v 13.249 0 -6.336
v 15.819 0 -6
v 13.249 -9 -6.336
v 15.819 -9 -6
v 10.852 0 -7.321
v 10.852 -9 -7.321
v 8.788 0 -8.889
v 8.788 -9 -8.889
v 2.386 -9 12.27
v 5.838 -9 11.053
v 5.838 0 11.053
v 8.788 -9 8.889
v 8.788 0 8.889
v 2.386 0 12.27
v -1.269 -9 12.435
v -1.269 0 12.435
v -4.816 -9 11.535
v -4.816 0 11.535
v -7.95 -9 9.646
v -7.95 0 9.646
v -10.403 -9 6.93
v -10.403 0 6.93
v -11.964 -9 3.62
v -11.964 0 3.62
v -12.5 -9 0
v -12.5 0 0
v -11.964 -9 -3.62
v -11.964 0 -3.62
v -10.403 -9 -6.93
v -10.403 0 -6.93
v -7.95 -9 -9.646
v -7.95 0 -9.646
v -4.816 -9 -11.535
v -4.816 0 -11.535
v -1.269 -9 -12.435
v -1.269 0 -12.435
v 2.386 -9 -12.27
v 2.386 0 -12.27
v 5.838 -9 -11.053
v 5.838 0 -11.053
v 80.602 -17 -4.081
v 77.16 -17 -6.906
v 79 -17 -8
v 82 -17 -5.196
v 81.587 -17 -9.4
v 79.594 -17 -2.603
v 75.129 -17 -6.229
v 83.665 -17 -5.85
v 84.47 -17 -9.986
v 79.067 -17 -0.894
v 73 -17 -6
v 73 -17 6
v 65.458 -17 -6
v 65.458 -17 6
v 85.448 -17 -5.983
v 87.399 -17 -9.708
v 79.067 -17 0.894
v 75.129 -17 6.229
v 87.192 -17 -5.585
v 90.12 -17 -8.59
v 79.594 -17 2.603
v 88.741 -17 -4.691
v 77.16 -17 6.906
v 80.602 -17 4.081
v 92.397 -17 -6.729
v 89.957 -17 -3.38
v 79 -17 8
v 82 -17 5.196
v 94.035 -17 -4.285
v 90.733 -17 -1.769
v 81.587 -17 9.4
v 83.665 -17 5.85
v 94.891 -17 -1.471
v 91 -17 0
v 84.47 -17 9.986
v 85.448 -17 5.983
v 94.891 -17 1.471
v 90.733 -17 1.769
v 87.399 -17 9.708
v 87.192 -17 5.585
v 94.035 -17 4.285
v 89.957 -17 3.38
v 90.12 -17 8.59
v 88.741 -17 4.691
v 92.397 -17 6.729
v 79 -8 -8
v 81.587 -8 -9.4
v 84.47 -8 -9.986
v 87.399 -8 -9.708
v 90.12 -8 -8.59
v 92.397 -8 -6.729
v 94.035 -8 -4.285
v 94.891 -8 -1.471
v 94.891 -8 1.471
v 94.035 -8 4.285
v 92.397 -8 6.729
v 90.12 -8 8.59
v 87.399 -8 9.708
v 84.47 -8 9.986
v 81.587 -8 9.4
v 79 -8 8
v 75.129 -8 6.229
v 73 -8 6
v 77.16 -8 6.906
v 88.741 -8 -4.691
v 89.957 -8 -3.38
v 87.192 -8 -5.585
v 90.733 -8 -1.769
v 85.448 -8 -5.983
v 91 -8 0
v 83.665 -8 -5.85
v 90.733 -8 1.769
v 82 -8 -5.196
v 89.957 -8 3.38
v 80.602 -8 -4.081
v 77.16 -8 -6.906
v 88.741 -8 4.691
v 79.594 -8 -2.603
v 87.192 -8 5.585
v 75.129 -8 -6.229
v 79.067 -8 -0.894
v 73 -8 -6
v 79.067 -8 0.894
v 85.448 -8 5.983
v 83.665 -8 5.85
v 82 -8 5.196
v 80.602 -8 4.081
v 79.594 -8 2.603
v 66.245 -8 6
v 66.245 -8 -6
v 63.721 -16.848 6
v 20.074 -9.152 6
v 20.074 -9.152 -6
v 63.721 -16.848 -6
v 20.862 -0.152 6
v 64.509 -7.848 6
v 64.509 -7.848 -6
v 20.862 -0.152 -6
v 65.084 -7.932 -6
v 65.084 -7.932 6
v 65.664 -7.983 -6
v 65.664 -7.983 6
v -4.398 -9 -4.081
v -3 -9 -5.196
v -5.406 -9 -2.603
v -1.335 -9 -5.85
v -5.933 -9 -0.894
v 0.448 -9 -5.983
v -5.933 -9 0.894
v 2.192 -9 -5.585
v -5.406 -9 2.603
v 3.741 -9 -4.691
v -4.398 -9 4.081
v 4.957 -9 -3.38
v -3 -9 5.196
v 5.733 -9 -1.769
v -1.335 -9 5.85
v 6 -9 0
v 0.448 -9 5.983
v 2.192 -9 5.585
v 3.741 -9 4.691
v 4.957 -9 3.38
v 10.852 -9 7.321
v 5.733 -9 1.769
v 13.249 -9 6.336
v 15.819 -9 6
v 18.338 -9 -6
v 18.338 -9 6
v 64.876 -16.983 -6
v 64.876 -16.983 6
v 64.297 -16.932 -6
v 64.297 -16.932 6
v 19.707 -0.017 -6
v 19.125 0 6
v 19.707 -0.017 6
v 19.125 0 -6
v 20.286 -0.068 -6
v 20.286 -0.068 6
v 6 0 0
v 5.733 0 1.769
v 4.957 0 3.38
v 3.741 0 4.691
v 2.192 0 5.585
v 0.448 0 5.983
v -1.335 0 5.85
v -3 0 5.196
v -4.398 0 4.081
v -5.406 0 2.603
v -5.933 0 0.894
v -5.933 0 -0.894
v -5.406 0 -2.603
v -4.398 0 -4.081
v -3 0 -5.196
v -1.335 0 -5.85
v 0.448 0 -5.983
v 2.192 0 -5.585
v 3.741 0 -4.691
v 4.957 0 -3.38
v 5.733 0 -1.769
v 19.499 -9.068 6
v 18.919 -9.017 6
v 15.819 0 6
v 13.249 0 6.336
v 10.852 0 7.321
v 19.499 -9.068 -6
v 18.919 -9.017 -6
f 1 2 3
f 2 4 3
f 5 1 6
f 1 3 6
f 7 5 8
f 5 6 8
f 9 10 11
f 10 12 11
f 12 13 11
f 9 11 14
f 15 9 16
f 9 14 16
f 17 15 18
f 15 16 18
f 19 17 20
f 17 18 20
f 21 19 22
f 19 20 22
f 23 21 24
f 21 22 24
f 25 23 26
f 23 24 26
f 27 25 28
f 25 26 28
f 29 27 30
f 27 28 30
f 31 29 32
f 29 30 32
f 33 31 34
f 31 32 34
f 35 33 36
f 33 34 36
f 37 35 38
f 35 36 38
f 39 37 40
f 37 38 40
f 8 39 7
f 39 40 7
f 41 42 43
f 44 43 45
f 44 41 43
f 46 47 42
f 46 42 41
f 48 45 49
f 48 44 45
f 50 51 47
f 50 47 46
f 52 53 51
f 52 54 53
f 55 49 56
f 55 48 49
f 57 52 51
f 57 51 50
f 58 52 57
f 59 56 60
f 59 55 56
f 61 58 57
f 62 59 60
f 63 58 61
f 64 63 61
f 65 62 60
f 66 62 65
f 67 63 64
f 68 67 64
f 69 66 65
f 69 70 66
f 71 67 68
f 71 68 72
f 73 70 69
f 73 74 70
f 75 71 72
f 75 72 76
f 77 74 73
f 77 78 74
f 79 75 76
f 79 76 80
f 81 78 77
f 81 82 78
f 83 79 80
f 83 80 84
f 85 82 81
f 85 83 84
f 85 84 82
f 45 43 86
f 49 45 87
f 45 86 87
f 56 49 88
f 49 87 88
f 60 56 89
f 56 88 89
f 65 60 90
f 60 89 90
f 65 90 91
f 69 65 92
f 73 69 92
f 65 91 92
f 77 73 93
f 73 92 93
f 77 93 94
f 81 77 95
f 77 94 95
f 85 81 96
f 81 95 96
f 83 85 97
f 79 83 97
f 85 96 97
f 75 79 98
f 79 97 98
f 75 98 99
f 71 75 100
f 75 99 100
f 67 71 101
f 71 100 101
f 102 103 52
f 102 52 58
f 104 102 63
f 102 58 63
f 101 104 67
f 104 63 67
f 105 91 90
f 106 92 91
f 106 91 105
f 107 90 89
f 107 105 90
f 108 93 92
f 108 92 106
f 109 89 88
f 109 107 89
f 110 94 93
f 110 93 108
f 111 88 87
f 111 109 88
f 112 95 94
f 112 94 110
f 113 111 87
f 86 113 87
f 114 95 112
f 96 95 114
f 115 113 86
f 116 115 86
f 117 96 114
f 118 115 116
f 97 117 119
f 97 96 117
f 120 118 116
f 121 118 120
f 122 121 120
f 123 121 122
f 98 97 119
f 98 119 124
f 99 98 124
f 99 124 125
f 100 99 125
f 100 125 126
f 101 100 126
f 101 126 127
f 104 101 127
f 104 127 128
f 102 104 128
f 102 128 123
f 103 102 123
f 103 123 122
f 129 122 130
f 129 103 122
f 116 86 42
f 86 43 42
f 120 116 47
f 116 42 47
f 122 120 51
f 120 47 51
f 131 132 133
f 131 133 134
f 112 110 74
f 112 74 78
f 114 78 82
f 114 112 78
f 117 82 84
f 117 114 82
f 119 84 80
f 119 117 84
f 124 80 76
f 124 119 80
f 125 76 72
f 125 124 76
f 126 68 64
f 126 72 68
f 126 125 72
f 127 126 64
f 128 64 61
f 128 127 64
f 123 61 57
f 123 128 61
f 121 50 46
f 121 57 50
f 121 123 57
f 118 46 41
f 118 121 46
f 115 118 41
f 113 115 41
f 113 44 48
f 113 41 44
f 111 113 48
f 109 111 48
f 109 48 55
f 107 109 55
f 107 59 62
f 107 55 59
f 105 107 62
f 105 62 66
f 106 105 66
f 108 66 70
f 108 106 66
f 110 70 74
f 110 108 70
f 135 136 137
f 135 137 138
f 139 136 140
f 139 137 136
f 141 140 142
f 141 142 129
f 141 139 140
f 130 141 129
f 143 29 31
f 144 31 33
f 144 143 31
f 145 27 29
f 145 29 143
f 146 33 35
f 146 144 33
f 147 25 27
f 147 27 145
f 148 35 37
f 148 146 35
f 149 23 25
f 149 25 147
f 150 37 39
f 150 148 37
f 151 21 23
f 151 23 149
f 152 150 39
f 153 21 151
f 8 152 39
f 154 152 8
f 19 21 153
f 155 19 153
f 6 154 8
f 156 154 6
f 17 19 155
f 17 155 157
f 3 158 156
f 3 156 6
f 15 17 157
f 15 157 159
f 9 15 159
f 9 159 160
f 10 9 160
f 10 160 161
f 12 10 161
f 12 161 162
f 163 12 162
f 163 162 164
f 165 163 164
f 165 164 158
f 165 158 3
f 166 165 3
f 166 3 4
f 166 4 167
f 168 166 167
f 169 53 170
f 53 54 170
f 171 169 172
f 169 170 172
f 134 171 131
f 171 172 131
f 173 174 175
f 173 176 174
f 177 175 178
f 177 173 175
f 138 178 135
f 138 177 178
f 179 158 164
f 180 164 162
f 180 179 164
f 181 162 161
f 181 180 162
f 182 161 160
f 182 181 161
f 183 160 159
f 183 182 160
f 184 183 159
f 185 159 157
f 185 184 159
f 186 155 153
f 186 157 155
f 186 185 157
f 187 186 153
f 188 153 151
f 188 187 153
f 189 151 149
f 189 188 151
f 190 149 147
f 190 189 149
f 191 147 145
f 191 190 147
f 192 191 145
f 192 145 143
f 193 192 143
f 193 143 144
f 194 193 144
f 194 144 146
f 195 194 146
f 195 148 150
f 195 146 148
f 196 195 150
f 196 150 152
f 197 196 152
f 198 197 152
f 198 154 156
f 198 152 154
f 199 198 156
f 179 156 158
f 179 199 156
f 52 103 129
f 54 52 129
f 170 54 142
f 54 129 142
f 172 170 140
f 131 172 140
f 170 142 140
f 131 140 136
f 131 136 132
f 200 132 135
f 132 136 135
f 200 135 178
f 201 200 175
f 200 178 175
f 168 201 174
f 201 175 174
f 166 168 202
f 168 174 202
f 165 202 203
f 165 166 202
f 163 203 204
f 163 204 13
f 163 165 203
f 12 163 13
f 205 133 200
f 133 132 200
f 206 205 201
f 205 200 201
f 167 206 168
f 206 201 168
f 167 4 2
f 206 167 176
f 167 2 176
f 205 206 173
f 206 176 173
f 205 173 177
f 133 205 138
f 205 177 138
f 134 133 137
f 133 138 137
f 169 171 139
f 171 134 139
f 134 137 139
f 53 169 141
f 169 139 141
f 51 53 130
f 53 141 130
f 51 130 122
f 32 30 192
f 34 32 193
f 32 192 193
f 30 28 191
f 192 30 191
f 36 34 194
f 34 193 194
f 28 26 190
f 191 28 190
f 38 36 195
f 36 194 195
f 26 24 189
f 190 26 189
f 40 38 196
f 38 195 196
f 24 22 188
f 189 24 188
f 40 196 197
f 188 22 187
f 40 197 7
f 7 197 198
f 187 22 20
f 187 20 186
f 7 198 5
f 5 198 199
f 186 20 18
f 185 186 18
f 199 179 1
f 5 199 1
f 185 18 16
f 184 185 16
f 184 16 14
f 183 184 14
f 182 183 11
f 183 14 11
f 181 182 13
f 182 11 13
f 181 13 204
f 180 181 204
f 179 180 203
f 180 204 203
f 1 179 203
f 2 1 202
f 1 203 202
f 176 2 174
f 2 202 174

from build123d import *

# Parameters (mm, degrees)
F0_R     = 6
F1_DEPTH = 25
F2_W     = 18
F2_H     = 9
F3_DEPTH = 12.5
F4_R     = 10


with BuildPart() as f1:
    # F0 (on Front) → F1 (new body)
    with BuildSketch(Plane.XZ):
        with BuildLine():
            Line((77, 6), (10.965856, 6))
            ThreePointArc((10.965856, 6), (-12.5, 0), (10.965856, -6))
            Line((10.965856, -6), (77, -6))
            ThreePointArc((77, -6), (95, 0), (77, 6))
        make_face()
        Circle(F0_R, mode=Mode.SUBTRACT)
        with Locations((85, 0)):
            Circle(F0_R, mode=Mode.SUBTRACT)
    extrude(amount=F1_DEPTH)

    # F2 (on Top) → F3 (intersect, symmetric)
    with BuildSketch(Plane.XY):
        Polygon((20, 0), (-12.5, 0), (-12.5, -9), (19.212602, -9), (64.582857, -17), (77, -17), (77, -8), (65.370255, -8), align=None)
        with Locations((86, -12.5)):
            Rectangle(F2_W, F2_H)
    extrude(amount=F3_DEPTH, both=True, mode=Mode.INTERSECT)

    # F4
    f4_edges = [f1.edges().sort_by_distance(p)[0] for p in [
        (10.965856, -4.5, 6),
        (77, -12.5, 6),
        (20, 0, 0),
        (65.370255, -8, 0),
        (77, -12.5, -6),
        (10.965856, -4.5, -6),
        (64.582857, -17, 0),
        (19.212602, -9, 0),
    ]]
    fillet(f4_edges, radius=F4_R)


solid = f1.part
